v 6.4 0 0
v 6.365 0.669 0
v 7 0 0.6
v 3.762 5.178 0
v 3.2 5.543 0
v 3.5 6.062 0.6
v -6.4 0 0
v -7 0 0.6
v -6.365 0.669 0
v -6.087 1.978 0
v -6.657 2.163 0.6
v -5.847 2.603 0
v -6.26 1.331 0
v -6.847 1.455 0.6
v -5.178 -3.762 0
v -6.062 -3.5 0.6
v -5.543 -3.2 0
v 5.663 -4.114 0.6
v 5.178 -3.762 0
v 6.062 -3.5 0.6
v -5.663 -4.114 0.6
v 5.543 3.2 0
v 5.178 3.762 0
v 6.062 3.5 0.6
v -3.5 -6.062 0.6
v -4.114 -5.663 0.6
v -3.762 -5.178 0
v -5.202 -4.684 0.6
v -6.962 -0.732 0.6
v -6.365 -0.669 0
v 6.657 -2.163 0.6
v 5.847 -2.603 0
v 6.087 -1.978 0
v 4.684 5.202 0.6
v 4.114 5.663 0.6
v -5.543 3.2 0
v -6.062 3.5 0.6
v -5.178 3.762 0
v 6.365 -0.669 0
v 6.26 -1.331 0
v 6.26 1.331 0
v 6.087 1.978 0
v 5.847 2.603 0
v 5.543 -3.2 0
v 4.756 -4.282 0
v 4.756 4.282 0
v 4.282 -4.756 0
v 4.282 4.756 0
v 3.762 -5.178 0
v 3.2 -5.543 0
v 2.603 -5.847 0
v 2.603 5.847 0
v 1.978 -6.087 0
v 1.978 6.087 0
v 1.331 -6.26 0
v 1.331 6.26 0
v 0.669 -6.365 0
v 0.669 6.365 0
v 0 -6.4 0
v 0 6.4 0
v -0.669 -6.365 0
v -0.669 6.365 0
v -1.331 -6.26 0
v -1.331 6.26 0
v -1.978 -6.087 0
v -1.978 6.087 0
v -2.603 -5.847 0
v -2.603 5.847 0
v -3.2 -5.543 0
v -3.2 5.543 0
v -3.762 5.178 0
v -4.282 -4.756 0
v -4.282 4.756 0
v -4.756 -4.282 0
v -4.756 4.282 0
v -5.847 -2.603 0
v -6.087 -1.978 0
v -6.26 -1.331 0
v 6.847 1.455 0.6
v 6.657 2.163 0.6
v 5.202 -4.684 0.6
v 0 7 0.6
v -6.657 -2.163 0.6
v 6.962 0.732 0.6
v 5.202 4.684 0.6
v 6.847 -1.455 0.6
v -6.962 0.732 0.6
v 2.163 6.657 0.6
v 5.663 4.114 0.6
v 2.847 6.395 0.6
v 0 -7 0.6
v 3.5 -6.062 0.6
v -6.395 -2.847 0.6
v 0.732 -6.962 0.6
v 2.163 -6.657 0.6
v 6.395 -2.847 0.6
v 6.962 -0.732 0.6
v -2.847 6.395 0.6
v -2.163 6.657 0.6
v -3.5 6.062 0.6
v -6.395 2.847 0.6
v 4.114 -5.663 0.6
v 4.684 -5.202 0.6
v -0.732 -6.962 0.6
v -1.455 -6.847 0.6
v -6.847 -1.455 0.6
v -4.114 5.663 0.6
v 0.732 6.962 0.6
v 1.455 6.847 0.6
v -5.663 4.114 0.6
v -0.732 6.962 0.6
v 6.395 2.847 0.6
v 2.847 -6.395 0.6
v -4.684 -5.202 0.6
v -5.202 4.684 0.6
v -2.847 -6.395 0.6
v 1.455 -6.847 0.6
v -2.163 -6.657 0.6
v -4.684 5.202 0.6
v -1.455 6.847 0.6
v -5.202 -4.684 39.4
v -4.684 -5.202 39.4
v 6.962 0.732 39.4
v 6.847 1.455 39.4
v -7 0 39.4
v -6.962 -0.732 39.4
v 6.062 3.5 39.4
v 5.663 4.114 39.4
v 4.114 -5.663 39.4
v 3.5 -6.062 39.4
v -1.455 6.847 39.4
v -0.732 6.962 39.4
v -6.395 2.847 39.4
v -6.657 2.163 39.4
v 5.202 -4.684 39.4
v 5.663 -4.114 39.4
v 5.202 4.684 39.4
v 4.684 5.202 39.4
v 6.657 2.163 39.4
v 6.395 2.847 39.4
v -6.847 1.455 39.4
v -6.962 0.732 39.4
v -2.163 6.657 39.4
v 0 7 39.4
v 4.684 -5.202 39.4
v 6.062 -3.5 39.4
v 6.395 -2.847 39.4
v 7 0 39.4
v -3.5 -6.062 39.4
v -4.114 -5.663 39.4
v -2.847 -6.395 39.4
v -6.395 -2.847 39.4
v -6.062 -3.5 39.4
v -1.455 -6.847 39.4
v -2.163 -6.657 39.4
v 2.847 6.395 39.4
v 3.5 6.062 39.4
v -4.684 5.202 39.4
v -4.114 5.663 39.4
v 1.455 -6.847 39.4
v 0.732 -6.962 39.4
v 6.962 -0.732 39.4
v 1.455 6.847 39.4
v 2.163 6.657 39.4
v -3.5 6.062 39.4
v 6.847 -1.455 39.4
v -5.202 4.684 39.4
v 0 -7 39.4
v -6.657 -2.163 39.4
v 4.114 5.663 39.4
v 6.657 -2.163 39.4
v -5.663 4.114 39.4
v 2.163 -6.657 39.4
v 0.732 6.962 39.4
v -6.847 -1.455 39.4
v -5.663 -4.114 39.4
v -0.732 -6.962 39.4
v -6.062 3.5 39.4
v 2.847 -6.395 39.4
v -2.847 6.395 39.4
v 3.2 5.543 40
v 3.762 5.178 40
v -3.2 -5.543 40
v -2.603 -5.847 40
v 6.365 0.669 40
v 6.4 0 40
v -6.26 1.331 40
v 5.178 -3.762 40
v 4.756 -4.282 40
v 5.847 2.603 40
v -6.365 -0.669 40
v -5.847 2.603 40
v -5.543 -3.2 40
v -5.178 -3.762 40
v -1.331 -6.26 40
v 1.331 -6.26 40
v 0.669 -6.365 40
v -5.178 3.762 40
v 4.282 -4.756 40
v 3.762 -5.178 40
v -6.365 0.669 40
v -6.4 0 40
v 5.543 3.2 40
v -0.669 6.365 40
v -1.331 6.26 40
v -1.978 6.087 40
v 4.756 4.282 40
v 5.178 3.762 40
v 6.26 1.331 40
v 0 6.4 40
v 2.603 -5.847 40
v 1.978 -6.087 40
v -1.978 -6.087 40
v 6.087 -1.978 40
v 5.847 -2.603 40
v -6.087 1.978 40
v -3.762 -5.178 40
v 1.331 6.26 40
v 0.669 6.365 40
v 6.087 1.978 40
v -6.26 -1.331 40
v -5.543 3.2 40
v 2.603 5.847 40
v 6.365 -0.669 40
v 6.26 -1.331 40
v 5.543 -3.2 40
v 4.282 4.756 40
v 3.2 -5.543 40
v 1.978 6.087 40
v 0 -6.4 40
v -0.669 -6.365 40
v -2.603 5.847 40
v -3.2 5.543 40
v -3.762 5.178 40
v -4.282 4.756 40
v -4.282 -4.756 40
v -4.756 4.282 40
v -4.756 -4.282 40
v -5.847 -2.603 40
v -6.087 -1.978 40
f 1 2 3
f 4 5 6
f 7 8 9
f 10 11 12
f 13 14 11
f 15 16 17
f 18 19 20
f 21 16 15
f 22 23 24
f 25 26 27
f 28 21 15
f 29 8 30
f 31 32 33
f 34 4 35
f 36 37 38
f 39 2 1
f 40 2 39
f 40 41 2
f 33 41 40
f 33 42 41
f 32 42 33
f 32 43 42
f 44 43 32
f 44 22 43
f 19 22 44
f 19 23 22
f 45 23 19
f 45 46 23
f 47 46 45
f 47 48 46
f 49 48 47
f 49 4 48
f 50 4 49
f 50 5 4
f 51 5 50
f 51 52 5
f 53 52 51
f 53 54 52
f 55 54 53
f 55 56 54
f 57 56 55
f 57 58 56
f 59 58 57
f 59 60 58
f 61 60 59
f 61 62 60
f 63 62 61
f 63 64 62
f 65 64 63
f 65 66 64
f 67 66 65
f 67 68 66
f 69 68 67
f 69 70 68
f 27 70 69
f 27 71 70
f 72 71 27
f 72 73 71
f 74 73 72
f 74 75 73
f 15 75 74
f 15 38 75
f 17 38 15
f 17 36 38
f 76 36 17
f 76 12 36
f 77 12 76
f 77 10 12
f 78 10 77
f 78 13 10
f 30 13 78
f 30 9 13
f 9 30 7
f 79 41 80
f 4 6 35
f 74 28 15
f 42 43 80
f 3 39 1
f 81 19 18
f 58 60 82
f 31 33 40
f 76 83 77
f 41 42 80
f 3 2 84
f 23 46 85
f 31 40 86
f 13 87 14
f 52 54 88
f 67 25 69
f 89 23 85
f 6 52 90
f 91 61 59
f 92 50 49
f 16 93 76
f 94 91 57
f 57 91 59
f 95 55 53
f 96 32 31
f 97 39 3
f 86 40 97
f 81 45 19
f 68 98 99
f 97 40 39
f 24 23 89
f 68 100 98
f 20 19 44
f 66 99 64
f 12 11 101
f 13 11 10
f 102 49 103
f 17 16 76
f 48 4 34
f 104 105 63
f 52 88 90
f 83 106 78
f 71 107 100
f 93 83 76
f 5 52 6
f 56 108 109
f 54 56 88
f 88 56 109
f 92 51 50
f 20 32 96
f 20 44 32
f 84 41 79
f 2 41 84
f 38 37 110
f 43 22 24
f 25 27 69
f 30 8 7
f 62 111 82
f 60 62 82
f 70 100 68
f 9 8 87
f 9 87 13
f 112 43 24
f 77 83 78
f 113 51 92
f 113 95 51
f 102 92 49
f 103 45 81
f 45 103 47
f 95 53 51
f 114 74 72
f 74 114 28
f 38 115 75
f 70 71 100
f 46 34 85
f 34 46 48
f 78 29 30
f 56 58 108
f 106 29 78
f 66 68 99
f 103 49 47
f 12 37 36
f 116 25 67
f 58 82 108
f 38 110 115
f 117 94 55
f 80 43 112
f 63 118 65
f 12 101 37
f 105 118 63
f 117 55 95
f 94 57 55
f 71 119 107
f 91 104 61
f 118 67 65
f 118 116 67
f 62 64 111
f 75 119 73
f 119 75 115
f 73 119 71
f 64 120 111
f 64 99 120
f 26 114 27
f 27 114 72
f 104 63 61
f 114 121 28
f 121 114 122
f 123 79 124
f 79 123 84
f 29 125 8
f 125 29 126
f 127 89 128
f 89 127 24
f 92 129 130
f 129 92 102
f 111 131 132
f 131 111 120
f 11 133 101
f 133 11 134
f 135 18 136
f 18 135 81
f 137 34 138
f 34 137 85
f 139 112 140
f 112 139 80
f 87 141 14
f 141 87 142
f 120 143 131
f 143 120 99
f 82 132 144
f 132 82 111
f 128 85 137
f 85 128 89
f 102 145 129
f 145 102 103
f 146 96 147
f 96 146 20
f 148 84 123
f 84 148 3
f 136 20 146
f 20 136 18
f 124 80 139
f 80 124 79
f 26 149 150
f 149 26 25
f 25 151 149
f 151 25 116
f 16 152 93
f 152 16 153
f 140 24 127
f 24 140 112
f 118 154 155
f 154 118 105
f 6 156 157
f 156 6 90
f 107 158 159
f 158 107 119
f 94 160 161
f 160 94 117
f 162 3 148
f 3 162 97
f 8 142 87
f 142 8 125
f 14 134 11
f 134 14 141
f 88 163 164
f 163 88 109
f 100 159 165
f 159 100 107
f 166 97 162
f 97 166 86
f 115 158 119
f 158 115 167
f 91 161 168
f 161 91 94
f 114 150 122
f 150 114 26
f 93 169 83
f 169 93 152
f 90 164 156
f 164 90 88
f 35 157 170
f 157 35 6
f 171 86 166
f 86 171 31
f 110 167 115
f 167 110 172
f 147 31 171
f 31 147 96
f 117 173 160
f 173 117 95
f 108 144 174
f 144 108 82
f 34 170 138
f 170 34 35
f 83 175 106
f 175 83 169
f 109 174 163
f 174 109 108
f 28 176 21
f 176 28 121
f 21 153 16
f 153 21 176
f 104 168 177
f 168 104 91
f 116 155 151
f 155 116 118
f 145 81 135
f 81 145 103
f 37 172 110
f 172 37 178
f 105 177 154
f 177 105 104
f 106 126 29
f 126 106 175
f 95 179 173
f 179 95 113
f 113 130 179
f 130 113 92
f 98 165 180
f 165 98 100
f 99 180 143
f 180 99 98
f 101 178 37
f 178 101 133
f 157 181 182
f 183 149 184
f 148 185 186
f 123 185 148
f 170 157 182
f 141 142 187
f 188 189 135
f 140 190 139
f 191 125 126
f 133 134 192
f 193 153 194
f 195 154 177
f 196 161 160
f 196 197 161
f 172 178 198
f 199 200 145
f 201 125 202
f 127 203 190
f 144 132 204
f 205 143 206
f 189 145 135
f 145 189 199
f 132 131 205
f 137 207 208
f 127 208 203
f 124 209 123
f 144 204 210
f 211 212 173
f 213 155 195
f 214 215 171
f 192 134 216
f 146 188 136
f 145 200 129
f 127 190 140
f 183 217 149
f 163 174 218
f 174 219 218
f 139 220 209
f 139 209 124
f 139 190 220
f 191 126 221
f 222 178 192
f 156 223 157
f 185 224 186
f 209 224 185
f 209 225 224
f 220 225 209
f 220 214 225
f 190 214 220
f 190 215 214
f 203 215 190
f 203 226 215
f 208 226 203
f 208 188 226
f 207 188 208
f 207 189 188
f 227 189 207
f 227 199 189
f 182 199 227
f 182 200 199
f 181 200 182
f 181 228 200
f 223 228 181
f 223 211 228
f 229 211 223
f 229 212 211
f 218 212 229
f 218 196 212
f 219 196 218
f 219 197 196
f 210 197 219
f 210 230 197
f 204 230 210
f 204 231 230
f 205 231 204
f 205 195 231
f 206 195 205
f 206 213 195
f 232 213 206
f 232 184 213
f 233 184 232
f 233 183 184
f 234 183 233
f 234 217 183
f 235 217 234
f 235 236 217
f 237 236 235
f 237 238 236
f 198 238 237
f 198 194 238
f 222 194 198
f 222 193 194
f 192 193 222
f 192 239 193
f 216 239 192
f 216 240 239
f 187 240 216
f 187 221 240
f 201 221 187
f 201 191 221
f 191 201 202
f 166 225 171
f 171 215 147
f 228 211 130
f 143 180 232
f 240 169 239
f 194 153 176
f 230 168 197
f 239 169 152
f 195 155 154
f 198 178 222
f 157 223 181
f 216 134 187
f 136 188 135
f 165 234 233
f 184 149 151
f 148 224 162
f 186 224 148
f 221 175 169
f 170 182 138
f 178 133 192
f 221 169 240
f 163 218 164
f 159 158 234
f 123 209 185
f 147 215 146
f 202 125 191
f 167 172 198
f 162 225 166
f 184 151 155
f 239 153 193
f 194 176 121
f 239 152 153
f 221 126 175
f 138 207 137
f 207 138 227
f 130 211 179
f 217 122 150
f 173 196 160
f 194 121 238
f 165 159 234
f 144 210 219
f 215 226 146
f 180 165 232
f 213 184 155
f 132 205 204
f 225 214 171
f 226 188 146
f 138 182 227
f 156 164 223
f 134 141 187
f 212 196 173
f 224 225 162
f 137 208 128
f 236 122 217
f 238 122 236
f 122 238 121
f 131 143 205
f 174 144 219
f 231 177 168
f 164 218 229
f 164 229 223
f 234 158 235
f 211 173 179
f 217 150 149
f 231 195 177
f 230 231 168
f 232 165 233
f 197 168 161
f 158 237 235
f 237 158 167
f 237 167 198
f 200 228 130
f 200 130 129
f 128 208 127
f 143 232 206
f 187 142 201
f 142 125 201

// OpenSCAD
// Chamfered dowel pin.
$fn = 60;
eps = 0.02;
diameter = 14;
length = 40;
chamfer = 0.6;
union() {
    cylinder(d1 = diameter - 2 * chamfer, d2 = diameter, h = chamfer);
    translate([0, 0, chamfer]) cylinder(d = diameter, h = length - 2 * chamfer);
    translate([0, 0, length - chamfer]) cylinder(d1 = diameter, d2 = diameter - 2 * chamfer, h = chamfer);
}
